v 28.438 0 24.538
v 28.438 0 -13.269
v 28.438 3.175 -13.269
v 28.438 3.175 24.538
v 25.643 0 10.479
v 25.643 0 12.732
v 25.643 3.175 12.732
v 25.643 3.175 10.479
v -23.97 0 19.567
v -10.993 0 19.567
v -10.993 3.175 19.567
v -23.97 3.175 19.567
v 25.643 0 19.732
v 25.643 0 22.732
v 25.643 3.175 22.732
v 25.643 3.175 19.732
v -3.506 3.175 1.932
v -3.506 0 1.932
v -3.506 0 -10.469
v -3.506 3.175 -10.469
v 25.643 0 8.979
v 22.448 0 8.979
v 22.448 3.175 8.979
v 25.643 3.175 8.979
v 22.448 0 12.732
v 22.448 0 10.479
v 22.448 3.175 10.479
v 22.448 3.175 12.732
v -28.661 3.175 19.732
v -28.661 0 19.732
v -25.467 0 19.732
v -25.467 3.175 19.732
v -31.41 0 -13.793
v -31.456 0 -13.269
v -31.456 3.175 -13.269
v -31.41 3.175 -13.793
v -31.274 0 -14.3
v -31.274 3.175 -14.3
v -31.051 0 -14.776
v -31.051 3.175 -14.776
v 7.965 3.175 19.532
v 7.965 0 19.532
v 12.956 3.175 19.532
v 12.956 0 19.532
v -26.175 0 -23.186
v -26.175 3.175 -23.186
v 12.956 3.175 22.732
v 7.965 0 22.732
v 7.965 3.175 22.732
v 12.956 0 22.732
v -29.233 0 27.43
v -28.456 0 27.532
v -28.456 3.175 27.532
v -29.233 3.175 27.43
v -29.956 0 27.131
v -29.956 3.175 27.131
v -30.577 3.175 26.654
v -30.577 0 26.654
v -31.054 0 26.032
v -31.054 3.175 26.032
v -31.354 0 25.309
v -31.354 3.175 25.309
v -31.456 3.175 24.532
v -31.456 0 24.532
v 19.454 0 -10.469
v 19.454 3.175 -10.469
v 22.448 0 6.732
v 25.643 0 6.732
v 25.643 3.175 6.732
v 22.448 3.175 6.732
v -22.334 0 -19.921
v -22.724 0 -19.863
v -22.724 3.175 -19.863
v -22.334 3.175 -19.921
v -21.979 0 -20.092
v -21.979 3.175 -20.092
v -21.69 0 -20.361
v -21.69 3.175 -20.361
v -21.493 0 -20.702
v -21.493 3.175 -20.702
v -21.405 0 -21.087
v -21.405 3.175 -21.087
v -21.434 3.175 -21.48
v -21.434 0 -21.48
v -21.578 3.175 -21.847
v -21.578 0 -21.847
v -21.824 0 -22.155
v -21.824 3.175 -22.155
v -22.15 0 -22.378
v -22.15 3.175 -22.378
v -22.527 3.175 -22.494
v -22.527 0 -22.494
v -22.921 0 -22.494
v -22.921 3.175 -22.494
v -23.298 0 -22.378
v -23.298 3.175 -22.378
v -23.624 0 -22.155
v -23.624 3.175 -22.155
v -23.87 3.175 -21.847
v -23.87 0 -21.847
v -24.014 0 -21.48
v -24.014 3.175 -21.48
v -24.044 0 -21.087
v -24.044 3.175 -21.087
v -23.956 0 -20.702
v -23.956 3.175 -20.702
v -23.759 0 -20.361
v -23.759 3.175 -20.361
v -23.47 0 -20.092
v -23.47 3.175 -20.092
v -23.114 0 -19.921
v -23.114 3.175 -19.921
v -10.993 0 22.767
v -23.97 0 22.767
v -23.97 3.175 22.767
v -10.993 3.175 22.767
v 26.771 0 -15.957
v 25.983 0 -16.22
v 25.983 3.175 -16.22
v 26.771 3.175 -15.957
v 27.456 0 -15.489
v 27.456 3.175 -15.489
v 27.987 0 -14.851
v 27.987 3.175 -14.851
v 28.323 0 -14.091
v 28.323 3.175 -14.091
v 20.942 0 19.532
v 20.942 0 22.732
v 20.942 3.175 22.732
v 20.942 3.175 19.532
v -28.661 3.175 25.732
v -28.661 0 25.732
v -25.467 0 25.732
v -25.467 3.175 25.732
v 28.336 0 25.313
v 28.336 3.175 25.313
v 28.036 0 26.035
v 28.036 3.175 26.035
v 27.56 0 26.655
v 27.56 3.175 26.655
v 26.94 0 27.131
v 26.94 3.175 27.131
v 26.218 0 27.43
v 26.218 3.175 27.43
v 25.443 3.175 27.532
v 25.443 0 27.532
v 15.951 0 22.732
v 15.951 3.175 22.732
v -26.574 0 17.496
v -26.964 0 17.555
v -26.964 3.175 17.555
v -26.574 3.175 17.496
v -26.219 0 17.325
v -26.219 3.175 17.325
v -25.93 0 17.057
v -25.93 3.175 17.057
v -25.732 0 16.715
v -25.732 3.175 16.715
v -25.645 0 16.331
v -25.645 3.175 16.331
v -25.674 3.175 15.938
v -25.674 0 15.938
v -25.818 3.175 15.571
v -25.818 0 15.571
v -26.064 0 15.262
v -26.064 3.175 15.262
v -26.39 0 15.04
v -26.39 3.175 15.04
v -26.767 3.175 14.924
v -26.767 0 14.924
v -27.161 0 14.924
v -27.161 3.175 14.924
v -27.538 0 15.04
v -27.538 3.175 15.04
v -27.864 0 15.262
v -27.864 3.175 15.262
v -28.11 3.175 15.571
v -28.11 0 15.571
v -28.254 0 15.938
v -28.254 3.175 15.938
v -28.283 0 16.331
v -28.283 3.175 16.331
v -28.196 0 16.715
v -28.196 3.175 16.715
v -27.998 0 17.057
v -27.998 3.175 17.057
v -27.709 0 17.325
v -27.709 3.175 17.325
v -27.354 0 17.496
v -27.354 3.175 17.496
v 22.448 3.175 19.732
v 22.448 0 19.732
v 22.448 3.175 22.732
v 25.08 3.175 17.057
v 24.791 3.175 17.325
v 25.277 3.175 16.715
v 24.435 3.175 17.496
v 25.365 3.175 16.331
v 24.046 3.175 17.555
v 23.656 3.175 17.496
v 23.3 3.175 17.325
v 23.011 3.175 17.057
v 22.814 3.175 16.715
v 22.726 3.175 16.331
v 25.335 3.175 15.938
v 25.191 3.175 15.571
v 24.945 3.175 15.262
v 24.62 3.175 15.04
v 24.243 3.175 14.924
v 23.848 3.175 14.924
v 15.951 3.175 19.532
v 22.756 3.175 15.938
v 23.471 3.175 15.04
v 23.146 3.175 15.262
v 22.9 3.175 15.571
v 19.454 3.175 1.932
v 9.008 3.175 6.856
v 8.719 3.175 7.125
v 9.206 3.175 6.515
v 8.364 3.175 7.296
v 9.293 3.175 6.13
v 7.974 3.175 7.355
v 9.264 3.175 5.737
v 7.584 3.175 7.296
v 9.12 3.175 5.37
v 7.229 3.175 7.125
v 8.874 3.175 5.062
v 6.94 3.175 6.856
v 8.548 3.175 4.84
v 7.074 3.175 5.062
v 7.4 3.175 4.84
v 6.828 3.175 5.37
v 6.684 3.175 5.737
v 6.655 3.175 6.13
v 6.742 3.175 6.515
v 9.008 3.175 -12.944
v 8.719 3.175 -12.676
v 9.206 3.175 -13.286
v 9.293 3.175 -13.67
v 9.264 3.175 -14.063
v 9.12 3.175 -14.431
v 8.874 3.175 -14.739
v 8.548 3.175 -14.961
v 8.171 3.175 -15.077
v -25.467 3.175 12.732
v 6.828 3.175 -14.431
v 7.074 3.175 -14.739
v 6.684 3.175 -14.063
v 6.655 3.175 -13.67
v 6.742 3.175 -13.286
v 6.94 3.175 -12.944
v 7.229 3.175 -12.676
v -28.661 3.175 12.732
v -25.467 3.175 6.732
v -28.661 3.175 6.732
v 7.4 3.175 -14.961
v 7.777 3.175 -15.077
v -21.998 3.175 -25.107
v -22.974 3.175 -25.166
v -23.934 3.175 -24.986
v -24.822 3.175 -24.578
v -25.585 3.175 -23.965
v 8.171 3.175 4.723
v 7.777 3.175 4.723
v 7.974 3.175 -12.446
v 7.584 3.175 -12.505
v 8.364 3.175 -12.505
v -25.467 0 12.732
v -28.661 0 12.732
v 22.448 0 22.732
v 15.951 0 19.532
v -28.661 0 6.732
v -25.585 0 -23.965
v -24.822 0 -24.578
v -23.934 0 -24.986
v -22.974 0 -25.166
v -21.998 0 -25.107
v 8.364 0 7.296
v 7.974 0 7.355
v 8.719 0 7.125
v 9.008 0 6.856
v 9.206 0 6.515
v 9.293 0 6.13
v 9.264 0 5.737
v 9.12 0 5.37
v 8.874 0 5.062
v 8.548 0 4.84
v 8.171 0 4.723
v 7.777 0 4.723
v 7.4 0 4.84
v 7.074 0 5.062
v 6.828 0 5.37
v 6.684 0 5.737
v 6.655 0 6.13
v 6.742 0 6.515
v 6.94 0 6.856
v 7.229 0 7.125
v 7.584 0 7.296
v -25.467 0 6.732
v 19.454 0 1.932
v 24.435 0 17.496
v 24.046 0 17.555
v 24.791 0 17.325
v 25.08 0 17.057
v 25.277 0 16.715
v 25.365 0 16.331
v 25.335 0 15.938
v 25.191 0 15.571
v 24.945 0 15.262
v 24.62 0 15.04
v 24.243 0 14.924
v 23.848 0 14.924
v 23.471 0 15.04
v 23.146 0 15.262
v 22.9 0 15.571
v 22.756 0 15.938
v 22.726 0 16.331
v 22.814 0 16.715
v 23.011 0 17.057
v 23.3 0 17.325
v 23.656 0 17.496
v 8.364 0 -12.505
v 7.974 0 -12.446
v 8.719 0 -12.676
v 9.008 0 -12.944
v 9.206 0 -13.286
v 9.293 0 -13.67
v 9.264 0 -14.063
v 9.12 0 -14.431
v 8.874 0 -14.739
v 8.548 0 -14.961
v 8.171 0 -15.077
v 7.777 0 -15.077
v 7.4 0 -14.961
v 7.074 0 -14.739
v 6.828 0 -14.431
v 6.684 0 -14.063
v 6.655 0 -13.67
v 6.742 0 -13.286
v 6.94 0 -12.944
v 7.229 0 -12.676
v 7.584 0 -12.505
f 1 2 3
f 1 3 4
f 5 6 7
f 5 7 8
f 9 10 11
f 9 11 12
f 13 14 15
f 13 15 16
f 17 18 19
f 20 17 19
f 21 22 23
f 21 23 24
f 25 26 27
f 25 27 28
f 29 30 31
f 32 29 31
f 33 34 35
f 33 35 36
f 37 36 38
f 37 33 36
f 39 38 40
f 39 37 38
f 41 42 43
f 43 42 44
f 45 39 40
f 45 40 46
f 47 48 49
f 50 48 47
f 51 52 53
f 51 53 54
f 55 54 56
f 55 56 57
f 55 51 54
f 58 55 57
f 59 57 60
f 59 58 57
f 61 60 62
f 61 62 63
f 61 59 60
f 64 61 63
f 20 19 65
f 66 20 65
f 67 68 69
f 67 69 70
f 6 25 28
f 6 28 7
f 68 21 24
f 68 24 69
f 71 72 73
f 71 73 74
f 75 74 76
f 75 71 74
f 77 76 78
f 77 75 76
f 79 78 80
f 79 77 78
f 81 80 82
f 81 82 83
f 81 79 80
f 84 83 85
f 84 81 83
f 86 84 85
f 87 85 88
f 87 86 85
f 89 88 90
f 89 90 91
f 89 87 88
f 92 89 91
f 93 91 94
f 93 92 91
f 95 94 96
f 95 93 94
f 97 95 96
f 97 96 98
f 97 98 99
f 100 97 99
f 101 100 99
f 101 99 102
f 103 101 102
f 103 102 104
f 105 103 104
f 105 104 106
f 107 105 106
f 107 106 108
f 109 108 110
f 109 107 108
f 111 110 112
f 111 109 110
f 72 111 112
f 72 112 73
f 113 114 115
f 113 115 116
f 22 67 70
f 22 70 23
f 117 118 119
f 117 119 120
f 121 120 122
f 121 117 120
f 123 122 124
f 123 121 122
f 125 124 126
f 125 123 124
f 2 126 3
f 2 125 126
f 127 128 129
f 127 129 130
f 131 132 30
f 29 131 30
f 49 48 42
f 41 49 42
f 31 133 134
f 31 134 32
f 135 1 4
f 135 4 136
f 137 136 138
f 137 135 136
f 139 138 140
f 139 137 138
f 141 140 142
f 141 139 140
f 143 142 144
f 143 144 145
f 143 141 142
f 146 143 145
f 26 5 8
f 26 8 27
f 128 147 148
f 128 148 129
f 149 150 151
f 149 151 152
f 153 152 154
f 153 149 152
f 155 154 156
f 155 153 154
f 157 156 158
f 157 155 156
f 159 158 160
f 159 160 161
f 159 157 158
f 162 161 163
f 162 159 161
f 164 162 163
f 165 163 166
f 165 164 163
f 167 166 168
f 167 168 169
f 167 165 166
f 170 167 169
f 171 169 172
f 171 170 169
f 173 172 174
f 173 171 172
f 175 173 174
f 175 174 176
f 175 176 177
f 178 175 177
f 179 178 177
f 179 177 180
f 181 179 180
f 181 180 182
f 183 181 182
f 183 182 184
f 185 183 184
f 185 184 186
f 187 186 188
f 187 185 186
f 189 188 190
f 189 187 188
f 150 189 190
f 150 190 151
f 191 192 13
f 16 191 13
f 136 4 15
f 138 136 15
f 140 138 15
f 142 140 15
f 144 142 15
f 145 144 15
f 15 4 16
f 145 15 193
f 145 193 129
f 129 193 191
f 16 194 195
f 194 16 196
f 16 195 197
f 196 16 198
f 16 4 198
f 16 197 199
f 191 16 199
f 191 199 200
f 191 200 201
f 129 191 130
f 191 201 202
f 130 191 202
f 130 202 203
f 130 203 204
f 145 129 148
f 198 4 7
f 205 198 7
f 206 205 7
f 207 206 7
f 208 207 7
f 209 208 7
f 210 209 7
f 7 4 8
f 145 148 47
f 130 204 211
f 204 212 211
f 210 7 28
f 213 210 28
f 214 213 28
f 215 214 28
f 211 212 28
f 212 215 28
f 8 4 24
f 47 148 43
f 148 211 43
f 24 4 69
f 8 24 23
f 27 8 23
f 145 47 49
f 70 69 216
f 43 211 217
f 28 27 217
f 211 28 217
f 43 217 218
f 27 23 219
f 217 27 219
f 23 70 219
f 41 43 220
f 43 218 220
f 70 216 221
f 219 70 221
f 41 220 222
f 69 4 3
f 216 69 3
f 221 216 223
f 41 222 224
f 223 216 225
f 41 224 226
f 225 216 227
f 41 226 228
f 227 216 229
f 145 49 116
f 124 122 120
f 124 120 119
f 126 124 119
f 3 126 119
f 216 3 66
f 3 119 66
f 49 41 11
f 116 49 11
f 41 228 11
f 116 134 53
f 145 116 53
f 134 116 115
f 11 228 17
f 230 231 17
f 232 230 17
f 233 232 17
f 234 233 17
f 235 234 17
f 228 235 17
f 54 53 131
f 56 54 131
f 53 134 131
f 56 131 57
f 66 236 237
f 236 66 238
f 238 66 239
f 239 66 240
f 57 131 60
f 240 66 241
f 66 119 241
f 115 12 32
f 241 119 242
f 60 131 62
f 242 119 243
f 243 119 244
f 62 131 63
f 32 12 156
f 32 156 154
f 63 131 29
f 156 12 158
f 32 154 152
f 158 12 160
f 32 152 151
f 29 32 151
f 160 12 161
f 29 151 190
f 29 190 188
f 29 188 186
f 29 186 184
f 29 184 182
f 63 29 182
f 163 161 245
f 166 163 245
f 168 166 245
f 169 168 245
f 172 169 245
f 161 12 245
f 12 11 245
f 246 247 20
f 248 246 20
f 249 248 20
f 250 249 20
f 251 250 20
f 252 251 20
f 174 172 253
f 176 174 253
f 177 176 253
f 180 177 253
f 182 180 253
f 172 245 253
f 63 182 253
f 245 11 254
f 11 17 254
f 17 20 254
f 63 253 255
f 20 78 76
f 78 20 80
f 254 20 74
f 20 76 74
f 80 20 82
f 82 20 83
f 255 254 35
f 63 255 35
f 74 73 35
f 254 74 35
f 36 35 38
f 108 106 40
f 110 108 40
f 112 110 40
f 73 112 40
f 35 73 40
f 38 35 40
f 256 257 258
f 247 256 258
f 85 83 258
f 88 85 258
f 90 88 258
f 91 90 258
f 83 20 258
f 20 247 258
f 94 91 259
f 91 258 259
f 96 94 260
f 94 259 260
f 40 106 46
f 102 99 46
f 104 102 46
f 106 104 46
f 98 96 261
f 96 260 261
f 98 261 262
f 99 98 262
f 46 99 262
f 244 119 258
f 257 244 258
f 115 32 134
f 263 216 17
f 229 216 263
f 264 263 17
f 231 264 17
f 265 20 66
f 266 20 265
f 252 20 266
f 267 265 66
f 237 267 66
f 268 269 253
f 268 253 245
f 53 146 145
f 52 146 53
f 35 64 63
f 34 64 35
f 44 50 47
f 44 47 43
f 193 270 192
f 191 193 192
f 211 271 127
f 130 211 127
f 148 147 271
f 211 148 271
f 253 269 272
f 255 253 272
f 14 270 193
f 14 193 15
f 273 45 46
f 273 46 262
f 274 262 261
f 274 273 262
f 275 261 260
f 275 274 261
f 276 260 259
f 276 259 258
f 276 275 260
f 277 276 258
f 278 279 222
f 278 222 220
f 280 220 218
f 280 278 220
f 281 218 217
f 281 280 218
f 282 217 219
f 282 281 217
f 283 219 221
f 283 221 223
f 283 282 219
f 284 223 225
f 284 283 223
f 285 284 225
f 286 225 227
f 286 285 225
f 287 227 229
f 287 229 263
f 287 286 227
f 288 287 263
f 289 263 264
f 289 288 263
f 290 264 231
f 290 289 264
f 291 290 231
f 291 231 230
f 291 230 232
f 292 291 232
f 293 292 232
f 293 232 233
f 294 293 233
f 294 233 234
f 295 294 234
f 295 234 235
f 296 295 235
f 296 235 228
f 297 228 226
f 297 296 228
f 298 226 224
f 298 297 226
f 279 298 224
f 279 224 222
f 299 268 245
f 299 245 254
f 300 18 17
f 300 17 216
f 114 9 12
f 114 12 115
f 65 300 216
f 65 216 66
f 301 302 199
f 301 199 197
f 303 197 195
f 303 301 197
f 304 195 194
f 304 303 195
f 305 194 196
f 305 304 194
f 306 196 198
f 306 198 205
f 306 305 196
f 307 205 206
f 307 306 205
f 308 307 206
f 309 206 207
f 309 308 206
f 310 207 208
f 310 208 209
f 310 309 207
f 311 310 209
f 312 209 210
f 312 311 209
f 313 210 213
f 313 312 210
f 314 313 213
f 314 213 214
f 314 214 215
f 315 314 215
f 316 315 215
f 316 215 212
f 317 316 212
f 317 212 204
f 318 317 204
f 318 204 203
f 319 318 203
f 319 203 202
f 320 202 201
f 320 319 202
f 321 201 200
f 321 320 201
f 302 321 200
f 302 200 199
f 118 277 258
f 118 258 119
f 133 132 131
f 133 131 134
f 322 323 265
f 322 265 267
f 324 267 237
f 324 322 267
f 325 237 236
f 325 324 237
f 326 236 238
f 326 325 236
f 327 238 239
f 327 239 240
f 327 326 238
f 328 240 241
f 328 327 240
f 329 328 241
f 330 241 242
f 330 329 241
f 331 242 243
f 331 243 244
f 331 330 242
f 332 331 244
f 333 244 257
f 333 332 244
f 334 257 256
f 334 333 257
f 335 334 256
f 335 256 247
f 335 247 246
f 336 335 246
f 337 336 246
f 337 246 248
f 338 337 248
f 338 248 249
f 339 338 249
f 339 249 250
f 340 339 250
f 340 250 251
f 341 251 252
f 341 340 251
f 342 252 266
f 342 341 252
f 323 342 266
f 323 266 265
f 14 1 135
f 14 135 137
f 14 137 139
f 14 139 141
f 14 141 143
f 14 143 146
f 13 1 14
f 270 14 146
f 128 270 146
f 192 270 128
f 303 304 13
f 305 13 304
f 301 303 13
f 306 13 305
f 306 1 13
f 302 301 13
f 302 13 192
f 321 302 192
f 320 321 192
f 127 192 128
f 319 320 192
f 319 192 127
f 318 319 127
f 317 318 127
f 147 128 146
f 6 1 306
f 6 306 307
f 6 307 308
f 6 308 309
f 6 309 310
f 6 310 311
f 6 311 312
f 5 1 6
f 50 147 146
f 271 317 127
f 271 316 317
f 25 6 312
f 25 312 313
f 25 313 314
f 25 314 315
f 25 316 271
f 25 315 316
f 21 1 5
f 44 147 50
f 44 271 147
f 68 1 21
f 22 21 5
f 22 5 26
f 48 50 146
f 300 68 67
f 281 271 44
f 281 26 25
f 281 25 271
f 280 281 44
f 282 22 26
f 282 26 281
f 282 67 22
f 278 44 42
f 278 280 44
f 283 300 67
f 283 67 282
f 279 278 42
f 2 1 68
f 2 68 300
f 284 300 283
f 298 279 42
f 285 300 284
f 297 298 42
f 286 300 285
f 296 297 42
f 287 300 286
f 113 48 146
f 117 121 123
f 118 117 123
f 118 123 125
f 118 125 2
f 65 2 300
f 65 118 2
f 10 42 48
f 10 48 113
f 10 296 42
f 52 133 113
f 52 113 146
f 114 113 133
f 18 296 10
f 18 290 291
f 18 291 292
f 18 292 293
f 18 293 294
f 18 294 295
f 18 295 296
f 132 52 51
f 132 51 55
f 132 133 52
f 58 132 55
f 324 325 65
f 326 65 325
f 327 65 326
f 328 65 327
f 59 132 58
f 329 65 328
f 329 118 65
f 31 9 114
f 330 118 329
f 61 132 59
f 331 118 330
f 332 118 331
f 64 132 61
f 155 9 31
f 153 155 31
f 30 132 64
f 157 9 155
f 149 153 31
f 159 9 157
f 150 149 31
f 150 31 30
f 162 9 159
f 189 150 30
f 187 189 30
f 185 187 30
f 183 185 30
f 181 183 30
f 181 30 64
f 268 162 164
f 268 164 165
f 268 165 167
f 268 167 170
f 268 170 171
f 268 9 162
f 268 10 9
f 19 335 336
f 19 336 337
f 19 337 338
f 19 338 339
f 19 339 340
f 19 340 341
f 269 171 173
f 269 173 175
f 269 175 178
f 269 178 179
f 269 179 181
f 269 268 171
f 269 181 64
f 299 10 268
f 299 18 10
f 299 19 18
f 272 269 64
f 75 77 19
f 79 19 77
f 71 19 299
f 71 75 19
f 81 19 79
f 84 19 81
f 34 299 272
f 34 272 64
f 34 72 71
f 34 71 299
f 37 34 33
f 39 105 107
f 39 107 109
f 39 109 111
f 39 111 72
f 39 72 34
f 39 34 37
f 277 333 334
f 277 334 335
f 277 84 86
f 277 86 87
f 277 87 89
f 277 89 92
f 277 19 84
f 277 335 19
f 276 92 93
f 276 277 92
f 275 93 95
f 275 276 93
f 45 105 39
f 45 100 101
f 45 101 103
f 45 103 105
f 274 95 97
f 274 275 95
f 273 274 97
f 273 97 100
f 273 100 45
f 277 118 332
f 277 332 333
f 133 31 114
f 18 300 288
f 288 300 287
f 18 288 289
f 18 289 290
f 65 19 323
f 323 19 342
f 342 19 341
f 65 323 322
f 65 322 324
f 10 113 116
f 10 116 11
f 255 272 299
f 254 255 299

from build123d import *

# Parameters (mm, degrees)
SKETCH1_W           = 3.194434014
SKETCH1_H           = 6.000224533
SKETCH1_W_2         = 12.976803263
SKETCH1_H_2         = 3.200223762
SKETCH1_R           = 1.323033288
SKETCH1_H_3         = 6.000288014
SKETCH1_W_3         = 4.991186163
SKETCH1_H_4         = 3.200091917
SKETCH1_W_4         = 4.990971694
SKETCH1_W_5         = 3.194492506
SKETCH1_H_5         = 3.000146449
SKETCH1_H_6         = 2.247069465
SKETCH1_W_6         = 22.959409558
SKETCH1_H_7         = 12.40053533
BOSS_EXTRUDE1_DEPTH = 3.175


with BuildPart() as part:
    # Sketch1 → Boss-Extrude1 (new body)
    with BuildSketch(Plane(origin=(0, 0, 0), x_dir=(1, 0, 0), z_dir=(0, 1, 0))):
        with BuildLine():
            Line((-28.456084878, -27.532431428), (25.442900716, -27.532431428))
            ThreePointArc((25.442900716, -27.532431428), (27.560473935, -26.65530708), (28.437609204, -24.537738386))
            Line((28.437609204, -24.537738386), (28.437804204, 13.268980227))
            ThreePointArc((28.437804204, 13.268980227), (27.743957441, 15.188191581), (25.983223234, 16.219991273))
            Line((25.983223234, 16.219991273), (-21.997773241, 25.107497345))
            ThreePointArc((-21.997773241, 25.107497345), (-24.390968499, 24.809261571), (-26.174789125, 23.186205164))
            Line((-26.174789125, 23.186205164), (-31.050867612, 14.775968165))
            ThreePointArc((-31.050867612, 14.775968165), (-31.352979308, 14.049412081), (-31.456040564, 13.269326446))
            Line((-31.456040564, 13.269326446), (-31.456040564, -24.532475742))
            ThreePointArc((-31.456040564, -24.532475742), (-30.577373887, -26.653764751), (-28.456084878, -27.532431428))
        make_face()
        with Locations((-27.063830276, -22.732321631)):
            Rectangle(SKETCH1_W, SKETCH1_H, mode=Mode.SUBTRACT)
        with Locations((-17.481737065, -21.16687035)):
            Rectangle(SKETCH1_W_2, SKETCH1_H_2, mode=Mode.SUBTRACT)
        with Locations((-26.963965218, -16.232064957)):
            Circle(SKETCH1_R, mode=Mode.SUBTRACT)
        with Locations((-27.063830275, -9.731776544)):
            Rectangle(SKETCH1_W, SKETCH1_H_3, mode=Mode.SUBTRACT)
        with Locations((10.460708795, -21.132309856)):
            Rectangle(SKETCH1_W_3, SKETCH1_H_4, mode=Mode.SUBTRACT)
        with Locations((18.446511119, -21.132309856)):
            Rectangle(SKETCH1_W_4, SKETCH1_H_4, mode=Mode.SUBTRACT)
        with Locations((24.045427435, -21.232282591)):
            Rectangle(SKETCH1_W_5, SKETCH1_H_5, mode=Mode.SUBTRACT)
        with Locations((24.045515173, -16.23206496)):
            Circle(SKETCH1_R, mode=Mode.SUBTRACT)
        with Locations((7.974006472, -6.031549942)):
            Circle(SKETCH1_R, mode=Mode.SUBTRACT)
        Polygon((22.448181182, -10.484914569), (22.448181182, -10.478708085), (25.642673688, -10.478708085), (25.642673688, -12.731920553), (22.448181182, -12.731920553), align=None, mode=Mode.SUBTRACT)
        with Locations((24.045427436, -7.855167272)):
            Rectangle(SKETCH1_W_5, SKETCH1_H_6, mode=Mode.SUBTRACT)
        with Locations((-22.724218332, 21.185636807)):
            Circle(SKETCH1_R, mode=Mode.SUBTRACT)
        with Locations((7.974006472, 4.268713184)):
            Rectangle(SKETCH1_W_6, SKETCH1_H_7, mode=Mode.SUBTRACT)
        with Locations((7.974006473, 13.76898446)):
            Circle(SKETCH1_R, mode=Mode.SUBTRACT)
    extrude(amount=BOSS_EXTRUDE1_DEPTH)


solid = part.part
